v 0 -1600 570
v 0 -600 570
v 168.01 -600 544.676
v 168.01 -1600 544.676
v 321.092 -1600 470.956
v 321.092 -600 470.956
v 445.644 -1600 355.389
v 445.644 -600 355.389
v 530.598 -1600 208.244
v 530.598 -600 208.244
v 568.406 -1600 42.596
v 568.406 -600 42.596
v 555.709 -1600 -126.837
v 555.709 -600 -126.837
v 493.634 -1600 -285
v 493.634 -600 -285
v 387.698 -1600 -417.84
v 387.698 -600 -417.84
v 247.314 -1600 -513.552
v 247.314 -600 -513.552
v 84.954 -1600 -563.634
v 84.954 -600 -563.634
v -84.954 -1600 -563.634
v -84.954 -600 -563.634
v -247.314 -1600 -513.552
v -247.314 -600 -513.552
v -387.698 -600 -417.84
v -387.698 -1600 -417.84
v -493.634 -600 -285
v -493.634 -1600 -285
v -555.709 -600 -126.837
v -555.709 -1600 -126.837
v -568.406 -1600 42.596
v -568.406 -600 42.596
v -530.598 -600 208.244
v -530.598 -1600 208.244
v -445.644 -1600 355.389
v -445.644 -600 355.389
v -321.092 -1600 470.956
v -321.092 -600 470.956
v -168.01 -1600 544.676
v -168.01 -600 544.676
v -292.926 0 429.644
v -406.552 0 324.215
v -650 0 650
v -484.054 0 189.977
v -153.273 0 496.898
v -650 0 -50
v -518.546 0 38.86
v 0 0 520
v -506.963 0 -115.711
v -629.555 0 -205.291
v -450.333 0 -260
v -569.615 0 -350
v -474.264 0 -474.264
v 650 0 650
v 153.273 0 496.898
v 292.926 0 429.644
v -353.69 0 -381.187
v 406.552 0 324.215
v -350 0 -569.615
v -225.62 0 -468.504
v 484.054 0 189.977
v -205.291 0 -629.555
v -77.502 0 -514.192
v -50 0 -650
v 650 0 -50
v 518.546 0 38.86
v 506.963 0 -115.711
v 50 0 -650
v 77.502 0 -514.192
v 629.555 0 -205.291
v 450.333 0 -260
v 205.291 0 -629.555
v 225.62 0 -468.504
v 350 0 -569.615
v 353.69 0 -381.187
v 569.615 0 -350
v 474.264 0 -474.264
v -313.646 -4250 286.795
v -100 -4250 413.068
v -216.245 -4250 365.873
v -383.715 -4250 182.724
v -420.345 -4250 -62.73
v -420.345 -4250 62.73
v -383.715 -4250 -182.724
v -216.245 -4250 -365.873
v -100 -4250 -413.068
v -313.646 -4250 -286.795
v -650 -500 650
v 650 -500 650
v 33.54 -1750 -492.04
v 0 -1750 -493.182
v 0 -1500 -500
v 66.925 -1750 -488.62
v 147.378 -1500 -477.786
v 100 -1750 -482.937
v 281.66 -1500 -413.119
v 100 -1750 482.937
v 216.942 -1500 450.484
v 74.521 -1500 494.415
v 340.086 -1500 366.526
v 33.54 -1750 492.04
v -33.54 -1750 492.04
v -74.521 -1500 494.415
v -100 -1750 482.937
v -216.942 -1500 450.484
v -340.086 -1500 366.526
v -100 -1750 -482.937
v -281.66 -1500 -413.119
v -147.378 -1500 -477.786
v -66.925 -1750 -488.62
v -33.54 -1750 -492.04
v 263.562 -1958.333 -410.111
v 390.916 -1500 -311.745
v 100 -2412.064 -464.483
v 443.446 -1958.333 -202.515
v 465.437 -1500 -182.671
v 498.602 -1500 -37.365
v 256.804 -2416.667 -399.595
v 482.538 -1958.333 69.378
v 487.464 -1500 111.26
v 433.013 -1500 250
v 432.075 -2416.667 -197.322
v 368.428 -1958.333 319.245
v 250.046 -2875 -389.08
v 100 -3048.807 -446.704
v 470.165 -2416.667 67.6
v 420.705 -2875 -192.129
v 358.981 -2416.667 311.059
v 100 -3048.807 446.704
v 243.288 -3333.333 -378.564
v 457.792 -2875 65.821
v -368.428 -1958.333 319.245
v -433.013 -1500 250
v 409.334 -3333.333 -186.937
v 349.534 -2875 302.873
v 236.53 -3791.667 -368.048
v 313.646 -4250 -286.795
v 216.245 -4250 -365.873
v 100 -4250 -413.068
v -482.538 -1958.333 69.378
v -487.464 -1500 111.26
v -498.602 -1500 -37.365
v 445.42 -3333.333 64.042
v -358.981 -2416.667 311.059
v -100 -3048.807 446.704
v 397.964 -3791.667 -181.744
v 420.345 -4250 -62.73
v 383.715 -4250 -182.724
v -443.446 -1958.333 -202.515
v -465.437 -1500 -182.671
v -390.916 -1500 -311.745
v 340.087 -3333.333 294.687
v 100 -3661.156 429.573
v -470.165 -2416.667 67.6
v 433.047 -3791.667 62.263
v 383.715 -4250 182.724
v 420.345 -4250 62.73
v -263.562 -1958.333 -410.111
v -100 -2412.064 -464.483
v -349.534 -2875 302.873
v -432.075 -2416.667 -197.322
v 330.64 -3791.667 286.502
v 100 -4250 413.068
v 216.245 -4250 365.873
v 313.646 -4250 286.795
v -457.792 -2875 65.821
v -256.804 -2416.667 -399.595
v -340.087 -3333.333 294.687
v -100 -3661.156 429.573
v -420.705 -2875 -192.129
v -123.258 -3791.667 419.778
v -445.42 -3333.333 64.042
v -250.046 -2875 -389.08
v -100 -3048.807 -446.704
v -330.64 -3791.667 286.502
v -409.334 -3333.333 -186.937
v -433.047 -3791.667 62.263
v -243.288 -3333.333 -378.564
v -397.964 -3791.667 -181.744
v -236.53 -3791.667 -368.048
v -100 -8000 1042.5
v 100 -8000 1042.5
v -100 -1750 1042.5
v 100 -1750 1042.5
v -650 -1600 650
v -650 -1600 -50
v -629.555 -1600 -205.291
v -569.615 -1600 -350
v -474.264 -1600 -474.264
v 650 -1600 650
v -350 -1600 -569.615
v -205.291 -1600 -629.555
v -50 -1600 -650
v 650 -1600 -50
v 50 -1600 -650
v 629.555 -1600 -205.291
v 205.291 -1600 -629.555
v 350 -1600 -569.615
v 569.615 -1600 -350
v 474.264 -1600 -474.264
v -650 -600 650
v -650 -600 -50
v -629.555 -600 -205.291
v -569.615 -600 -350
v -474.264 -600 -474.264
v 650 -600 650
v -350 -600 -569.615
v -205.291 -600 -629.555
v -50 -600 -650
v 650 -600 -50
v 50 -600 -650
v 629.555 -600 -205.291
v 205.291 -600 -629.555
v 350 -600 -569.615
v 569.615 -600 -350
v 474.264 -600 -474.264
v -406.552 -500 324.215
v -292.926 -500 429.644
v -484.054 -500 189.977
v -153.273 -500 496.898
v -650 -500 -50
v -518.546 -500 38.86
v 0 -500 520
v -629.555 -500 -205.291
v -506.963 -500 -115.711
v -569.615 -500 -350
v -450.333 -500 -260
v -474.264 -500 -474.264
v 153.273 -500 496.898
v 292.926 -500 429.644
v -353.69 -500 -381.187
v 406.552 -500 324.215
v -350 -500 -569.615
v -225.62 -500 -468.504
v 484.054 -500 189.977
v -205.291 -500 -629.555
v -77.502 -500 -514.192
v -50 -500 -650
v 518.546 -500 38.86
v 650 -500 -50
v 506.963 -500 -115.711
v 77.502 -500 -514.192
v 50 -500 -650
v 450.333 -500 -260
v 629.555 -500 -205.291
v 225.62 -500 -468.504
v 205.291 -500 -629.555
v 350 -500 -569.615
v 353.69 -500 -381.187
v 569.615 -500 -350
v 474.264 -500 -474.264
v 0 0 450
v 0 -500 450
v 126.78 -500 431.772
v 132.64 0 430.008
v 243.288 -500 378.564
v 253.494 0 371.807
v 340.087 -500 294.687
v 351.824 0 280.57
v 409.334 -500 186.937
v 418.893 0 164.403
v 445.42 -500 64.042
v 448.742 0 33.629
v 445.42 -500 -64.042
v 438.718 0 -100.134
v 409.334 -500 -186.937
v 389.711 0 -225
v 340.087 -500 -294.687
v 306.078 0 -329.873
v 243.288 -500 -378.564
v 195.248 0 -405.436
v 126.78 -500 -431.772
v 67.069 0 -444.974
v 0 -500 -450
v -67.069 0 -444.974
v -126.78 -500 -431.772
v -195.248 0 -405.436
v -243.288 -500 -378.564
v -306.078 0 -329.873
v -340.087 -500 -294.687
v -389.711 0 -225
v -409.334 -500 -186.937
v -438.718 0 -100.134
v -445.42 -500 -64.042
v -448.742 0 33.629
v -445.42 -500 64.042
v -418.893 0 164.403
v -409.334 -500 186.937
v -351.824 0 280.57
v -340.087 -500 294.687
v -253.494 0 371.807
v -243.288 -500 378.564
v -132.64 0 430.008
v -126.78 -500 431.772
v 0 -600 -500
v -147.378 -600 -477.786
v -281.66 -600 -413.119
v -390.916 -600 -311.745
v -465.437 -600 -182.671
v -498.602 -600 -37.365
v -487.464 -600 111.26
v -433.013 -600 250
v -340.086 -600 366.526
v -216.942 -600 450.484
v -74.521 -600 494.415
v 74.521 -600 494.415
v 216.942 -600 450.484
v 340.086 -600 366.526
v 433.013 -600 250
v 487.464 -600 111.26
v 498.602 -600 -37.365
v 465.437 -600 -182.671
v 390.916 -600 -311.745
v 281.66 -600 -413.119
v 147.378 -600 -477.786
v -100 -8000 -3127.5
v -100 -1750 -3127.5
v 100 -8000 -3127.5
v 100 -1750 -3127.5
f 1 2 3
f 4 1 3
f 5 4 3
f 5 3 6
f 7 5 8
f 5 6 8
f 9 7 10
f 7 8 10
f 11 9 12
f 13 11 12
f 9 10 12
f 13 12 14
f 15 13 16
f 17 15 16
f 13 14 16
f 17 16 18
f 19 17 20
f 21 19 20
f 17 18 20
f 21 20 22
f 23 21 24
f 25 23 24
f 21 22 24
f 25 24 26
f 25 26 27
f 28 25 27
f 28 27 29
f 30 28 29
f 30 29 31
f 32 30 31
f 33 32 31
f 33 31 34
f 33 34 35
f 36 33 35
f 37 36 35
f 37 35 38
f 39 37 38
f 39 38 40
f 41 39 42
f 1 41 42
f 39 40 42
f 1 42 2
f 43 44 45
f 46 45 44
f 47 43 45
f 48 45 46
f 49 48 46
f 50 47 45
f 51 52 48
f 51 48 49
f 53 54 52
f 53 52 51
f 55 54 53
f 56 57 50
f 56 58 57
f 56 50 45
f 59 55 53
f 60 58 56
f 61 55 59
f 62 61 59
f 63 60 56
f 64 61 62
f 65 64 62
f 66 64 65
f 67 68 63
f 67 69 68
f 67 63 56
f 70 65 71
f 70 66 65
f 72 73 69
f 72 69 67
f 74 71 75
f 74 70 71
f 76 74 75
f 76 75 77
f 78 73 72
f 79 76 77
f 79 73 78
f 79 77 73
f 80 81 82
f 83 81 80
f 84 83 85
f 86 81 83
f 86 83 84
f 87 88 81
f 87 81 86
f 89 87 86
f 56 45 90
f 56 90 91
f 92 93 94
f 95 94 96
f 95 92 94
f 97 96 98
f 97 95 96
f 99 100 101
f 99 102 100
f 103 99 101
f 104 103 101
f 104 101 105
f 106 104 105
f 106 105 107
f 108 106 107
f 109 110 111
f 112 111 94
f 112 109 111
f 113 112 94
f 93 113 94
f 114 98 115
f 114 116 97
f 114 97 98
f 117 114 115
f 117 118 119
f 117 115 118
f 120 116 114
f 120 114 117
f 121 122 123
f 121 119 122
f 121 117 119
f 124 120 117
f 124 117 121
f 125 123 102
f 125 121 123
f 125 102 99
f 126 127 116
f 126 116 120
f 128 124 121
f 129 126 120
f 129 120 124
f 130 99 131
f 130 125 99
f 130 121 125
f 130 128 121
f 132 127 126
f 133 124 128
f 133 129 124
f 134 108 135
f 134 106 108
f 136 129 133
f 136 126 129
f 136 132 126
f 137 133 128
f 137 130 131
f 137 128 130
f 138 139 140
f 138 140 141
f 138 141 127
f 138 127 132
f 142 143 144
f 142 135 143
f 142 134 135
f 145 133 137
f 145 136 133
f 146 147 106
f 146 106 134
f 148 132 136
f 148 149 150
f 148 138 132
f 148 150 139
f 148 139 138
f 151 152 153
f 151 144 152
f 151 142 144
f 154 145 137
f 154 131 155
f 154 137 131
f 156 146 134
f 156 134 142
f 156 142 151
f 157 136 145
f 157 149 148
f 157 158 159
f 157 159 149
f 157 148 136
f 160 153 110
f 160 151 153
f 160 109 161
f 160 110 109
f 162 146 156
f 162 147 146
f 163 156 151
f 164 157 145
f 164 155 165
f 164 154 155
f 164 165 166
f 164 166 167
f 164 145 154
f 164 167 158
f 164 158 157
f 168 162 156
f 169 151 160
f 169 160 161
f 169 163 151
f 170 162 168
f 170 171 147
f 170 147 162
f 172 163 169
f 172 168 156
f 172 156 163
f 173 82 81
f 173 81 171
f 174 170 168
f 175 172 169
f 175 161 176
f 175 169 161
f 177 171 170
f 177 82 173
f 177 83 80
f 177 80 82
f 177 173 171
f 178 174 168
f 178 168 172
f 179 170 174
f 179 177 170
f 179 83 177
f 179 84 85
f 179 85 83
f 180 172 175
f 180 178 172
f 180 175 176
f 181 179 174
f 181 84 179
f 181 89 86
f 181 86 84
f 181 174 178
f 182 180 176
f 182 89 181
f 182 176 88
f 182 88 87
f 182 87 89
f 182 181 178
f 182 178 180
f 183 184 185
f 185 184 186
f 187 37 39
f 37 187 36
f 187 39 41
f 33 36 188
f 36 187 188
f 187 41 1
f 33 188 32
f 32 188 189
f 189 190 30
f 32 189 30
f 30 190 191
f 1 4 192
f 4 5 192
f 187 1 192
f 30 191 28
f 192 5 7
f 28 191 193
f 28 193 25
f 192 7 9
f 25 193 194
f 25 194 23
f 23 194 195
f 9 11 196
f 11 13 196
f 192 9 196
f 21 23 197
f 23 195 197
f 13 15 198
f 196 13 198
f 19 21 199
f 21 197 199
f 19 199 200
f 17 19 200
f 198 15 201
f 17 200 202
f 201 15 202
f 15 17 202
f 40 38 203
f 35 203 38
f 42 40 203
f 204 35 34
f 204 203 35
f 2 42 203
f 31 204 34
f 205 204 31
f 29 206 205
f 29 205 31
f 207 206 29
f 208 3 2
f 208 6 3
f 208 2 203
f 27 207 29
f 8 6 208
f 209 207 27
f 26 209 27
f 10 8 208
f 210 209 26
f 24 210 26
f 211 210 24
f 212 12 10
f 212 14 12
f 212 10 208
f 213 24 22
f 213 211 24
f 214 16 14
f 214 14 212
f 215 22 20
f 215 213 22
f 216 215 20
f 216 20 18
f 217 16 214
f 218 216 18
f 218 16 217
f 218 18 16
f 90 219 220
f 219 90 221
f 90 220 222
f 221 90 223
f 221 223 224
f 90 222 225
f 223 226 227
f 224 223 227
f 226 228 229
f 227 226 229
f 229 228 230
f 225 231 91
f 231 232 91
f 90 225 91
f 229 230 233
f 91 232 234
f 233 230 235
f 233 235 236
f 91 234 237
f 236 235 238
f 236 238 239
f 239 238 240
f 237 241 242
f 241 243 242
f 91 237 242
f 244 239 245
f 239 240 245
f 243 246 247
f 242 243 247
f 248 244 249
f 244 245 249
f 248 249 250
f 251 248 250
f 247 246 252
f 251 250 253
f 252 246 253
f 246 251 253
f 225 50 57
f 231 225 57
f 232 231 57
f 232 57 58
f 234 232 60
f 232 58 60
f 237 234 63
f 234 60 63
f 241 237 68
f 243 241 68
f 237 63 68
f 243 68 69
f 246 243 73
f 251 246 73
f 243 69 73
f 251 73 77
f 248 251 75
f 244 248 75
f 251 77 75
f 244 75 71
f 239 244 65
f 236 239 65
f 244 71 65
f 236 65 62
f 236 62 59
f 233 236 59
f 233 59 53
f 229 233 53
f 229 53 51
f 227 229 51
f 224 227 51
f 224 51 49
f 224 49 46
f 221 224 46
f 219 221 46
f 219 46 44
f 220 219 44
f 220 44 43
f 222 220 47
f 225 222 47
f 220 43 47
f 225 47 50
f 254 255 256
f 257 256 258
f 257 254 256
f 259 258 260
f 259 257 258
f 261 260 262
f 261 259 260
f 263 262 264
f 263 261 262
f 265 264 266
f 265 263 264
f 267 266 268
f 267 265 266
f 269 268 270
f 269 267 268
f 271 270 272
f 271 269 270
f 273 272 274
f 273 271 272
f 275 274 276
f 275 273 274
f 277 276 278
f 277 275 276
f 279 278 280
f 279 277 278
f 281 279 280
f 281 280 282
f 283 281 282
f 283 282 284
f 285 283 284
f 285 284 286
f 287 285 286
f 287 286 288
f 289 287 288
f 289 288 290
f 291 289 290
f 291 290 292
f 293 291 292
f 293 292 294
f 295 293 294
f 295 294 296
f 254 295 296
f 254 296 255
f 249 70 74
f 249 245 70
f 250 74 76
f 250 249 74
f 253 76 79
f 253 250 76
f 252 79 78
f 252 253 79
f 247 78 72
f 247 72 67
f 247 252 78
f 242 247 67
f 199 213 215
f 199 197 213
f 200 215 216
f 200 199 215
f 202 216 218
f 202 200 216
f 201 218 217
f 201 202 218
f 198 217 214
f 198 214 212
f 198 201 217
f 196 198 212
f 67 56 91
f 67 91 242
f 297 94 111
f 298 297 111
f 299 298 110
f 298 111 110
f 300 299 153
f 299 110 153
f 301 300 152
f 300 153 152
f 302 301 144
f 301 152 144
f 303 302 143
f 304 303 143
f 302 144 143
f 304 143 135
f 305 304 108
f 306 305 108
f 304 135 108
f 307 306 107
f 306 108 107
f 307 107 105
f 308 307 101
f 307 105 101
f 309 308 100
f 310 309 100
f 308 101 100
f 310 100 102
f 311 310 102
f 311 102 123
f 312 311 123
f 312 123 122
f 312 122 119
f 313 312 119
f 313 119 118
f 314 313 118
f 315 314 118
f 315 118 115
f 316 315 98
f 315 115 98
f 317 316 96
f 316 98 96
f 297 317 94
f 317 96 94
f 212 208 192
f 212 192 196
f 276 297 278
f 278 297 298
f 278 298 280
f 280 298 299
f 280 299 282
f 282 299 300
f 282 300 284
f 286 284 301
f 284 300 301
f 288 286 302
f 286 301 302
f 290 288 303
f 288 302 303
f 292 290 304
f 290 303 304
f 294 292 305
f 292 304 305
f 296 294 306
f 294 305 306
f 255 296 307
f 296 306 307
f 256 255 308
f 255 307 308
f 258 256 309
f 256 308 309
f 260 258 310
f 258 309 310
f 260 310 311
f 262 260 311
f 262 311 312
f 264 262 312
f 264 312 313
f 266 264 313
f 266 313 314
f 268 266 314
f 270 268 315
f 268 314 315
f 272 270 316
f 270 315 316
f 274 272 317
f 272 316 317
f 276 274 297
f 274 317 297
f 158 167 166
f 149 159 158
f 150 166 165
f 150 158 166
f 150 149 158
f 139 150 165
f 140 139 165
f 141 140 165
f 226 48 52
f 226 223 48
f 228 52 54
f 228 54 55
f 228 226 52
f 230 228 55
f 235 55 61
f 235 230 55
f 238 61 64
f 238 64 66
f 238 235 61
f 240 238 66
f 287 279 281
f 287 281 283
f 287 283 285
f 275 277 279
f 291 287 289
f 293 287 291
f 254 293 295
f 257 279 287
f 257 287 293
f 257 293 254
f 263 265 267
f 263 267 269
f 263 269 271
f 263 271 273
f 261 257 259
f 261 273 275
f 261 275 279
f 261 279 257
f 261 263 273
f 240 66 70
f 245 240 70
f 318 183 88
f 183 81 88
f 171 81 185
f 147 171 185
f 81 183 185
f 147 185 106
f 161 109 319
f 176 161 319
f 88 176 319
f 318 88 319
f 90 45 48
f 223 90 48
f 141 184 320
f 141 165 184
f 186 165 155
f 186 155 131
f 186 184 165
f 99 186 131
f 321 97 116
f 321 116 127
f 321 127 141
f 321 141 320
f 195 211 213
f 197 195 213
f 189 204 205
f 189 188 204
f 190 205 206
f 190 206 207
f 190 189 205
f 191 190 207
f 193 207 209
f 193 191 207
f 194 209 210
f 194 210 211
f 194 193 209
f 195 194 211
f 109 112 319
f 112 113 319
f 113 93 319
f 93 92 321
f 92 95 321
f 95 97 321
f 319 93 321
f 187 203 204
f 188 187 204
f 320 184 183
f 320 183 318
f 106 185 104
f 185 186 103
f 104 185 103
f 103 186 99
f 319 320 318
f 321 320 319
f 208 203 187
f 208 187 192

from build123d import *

# Parameters (mm, degrees)
SKETCH_8_R       = 450
EXTRUDE_3_DEPTH  = 500
SKETCH_20_R      = 425
SKETCH_22_W      = 4170
SKETCH_22_H      = 6250
EXTRUDE_9_DEPTH  = 100
SKETCH_23_W      = 1300
SKETCH_23_H      = 1300
SKETCH_23_R      = 520
EXTRUDE_10_DEPTH = 500
SKETCH_24_W      = 1300
SKETCH_24_H      = 1300
SKETCH_24_R      = 570
EXTRUDE_11_DEPTH = 1000
FILLET_1_R       = 600
FILLET_2_R       = 600


with BuildPart() as part:
    # 草图8 → 凸台-拉伸3 (new body)
    with BuildSketch(Plane(origin=(0, 0, 0), x_dir=(1, 0, 0), z_dir=(0, 1, 0))):
        with Locations(Location((0, 0, 0), (0, 0, 270))):
            Circle(SKETCH_8_R)
    extrude(amount=-EXTRUDE_3_DEPTH)

    # 草图19 → 旋转1 (revolve)
    with BuildSketch(Plane(origin=(0, 0, 0), x_dir=(0, 0, -1), z_dir=(1, 0, 0))):
        Polygon((450, -500), (500, -600), (500, -1500), (0, -1500), (0, -500), align=None)
    revolve(axis=Axis((0, -1500, 0), (0, 1, 0)))

    # 草图20 → section 1 of loft_2
    with BuildSketch(Plane(origin=(0, -4250, 0), x_dir=(-1, 0, 0), z_dir=(0, -1, 0)), mode=Mode.PRIVATE) as loft_2_s1:
        Circle(SKETCH_20_R)
    # loft up to a face of the part (loft_2)
    loft([Face(Wire([part.edges().sort_by_distance((364.484313711, -1500, 342.273552964))[0]])), loft_2_s1.sketch])

    # 草图22 → 凸台-拉伸9 (add, symmetric)
    with BuildSketch(Plane(origin=(0, 0, 0), x_dir=(0, 0, -1), z_dir=(1, 0, 0))):
        with Locations((1042.5, -4875)):
            Rectangle(SKETCH_22_W, SKETCH_22_H)
    extrude(amount=EXTRUDE_9_DEPTH, both=True)


with BuildPart() as body_2:
    # 草图23 → 凸台-拉伸10 (new body)
    with BuildSketch(Plane(origin=(0, 0, 0), x_dir=(1, 0, 0), z_dir=(0, 1, 0))):
        Rectangle(SKETCH_23_W, SKETCH_23_H)
        with Locations(Location((0, 0, 0), (0, 0, 270))):
            Circle(SKETCH_23_R, mode=Mode.SUBTRACT)
    extrude(amount=-EXTRUDE_10_DEPTH)

    # 圆角1
    fillet_1_edges = [body_2.edges().sort_by_distance(p)[0] for p in [
        (-650, -250, -650),
        (650, -250, -650),
    ]]
    fillet(fillet_1_edges, radius=FILLET_1_R)


with BuildPart() as body_3:
    # 草图24 → 凸台-拉伸11 (new body)
    with BuildSketch(Plane(origin=(0, -600, 0), x_dir=(1, 0, 0), z_dir=(0, 1, 0))):
        Rectangle(SKETCH_24_W, SKETCH_24_H)
        with Locations(Location((0, 0, 0), (0, 0, 270))):
            Circle(SKETCH_24_R, mode=Mode.SUBTRACT)
    extrude(amount=-EXTRUDE_11_DEPTH)

    # 圆角2
    fillet_2_edges = [body_3.edges().sort_by_distance(p)[0] for p in [
        (-650, -1100, -650),
        (650, -1100, -650),
    ]]
    fillet(fillet_2_edges, radius=FILLET_2_R)


solid = Compound([part.part, body_2.part, body_3.part])
